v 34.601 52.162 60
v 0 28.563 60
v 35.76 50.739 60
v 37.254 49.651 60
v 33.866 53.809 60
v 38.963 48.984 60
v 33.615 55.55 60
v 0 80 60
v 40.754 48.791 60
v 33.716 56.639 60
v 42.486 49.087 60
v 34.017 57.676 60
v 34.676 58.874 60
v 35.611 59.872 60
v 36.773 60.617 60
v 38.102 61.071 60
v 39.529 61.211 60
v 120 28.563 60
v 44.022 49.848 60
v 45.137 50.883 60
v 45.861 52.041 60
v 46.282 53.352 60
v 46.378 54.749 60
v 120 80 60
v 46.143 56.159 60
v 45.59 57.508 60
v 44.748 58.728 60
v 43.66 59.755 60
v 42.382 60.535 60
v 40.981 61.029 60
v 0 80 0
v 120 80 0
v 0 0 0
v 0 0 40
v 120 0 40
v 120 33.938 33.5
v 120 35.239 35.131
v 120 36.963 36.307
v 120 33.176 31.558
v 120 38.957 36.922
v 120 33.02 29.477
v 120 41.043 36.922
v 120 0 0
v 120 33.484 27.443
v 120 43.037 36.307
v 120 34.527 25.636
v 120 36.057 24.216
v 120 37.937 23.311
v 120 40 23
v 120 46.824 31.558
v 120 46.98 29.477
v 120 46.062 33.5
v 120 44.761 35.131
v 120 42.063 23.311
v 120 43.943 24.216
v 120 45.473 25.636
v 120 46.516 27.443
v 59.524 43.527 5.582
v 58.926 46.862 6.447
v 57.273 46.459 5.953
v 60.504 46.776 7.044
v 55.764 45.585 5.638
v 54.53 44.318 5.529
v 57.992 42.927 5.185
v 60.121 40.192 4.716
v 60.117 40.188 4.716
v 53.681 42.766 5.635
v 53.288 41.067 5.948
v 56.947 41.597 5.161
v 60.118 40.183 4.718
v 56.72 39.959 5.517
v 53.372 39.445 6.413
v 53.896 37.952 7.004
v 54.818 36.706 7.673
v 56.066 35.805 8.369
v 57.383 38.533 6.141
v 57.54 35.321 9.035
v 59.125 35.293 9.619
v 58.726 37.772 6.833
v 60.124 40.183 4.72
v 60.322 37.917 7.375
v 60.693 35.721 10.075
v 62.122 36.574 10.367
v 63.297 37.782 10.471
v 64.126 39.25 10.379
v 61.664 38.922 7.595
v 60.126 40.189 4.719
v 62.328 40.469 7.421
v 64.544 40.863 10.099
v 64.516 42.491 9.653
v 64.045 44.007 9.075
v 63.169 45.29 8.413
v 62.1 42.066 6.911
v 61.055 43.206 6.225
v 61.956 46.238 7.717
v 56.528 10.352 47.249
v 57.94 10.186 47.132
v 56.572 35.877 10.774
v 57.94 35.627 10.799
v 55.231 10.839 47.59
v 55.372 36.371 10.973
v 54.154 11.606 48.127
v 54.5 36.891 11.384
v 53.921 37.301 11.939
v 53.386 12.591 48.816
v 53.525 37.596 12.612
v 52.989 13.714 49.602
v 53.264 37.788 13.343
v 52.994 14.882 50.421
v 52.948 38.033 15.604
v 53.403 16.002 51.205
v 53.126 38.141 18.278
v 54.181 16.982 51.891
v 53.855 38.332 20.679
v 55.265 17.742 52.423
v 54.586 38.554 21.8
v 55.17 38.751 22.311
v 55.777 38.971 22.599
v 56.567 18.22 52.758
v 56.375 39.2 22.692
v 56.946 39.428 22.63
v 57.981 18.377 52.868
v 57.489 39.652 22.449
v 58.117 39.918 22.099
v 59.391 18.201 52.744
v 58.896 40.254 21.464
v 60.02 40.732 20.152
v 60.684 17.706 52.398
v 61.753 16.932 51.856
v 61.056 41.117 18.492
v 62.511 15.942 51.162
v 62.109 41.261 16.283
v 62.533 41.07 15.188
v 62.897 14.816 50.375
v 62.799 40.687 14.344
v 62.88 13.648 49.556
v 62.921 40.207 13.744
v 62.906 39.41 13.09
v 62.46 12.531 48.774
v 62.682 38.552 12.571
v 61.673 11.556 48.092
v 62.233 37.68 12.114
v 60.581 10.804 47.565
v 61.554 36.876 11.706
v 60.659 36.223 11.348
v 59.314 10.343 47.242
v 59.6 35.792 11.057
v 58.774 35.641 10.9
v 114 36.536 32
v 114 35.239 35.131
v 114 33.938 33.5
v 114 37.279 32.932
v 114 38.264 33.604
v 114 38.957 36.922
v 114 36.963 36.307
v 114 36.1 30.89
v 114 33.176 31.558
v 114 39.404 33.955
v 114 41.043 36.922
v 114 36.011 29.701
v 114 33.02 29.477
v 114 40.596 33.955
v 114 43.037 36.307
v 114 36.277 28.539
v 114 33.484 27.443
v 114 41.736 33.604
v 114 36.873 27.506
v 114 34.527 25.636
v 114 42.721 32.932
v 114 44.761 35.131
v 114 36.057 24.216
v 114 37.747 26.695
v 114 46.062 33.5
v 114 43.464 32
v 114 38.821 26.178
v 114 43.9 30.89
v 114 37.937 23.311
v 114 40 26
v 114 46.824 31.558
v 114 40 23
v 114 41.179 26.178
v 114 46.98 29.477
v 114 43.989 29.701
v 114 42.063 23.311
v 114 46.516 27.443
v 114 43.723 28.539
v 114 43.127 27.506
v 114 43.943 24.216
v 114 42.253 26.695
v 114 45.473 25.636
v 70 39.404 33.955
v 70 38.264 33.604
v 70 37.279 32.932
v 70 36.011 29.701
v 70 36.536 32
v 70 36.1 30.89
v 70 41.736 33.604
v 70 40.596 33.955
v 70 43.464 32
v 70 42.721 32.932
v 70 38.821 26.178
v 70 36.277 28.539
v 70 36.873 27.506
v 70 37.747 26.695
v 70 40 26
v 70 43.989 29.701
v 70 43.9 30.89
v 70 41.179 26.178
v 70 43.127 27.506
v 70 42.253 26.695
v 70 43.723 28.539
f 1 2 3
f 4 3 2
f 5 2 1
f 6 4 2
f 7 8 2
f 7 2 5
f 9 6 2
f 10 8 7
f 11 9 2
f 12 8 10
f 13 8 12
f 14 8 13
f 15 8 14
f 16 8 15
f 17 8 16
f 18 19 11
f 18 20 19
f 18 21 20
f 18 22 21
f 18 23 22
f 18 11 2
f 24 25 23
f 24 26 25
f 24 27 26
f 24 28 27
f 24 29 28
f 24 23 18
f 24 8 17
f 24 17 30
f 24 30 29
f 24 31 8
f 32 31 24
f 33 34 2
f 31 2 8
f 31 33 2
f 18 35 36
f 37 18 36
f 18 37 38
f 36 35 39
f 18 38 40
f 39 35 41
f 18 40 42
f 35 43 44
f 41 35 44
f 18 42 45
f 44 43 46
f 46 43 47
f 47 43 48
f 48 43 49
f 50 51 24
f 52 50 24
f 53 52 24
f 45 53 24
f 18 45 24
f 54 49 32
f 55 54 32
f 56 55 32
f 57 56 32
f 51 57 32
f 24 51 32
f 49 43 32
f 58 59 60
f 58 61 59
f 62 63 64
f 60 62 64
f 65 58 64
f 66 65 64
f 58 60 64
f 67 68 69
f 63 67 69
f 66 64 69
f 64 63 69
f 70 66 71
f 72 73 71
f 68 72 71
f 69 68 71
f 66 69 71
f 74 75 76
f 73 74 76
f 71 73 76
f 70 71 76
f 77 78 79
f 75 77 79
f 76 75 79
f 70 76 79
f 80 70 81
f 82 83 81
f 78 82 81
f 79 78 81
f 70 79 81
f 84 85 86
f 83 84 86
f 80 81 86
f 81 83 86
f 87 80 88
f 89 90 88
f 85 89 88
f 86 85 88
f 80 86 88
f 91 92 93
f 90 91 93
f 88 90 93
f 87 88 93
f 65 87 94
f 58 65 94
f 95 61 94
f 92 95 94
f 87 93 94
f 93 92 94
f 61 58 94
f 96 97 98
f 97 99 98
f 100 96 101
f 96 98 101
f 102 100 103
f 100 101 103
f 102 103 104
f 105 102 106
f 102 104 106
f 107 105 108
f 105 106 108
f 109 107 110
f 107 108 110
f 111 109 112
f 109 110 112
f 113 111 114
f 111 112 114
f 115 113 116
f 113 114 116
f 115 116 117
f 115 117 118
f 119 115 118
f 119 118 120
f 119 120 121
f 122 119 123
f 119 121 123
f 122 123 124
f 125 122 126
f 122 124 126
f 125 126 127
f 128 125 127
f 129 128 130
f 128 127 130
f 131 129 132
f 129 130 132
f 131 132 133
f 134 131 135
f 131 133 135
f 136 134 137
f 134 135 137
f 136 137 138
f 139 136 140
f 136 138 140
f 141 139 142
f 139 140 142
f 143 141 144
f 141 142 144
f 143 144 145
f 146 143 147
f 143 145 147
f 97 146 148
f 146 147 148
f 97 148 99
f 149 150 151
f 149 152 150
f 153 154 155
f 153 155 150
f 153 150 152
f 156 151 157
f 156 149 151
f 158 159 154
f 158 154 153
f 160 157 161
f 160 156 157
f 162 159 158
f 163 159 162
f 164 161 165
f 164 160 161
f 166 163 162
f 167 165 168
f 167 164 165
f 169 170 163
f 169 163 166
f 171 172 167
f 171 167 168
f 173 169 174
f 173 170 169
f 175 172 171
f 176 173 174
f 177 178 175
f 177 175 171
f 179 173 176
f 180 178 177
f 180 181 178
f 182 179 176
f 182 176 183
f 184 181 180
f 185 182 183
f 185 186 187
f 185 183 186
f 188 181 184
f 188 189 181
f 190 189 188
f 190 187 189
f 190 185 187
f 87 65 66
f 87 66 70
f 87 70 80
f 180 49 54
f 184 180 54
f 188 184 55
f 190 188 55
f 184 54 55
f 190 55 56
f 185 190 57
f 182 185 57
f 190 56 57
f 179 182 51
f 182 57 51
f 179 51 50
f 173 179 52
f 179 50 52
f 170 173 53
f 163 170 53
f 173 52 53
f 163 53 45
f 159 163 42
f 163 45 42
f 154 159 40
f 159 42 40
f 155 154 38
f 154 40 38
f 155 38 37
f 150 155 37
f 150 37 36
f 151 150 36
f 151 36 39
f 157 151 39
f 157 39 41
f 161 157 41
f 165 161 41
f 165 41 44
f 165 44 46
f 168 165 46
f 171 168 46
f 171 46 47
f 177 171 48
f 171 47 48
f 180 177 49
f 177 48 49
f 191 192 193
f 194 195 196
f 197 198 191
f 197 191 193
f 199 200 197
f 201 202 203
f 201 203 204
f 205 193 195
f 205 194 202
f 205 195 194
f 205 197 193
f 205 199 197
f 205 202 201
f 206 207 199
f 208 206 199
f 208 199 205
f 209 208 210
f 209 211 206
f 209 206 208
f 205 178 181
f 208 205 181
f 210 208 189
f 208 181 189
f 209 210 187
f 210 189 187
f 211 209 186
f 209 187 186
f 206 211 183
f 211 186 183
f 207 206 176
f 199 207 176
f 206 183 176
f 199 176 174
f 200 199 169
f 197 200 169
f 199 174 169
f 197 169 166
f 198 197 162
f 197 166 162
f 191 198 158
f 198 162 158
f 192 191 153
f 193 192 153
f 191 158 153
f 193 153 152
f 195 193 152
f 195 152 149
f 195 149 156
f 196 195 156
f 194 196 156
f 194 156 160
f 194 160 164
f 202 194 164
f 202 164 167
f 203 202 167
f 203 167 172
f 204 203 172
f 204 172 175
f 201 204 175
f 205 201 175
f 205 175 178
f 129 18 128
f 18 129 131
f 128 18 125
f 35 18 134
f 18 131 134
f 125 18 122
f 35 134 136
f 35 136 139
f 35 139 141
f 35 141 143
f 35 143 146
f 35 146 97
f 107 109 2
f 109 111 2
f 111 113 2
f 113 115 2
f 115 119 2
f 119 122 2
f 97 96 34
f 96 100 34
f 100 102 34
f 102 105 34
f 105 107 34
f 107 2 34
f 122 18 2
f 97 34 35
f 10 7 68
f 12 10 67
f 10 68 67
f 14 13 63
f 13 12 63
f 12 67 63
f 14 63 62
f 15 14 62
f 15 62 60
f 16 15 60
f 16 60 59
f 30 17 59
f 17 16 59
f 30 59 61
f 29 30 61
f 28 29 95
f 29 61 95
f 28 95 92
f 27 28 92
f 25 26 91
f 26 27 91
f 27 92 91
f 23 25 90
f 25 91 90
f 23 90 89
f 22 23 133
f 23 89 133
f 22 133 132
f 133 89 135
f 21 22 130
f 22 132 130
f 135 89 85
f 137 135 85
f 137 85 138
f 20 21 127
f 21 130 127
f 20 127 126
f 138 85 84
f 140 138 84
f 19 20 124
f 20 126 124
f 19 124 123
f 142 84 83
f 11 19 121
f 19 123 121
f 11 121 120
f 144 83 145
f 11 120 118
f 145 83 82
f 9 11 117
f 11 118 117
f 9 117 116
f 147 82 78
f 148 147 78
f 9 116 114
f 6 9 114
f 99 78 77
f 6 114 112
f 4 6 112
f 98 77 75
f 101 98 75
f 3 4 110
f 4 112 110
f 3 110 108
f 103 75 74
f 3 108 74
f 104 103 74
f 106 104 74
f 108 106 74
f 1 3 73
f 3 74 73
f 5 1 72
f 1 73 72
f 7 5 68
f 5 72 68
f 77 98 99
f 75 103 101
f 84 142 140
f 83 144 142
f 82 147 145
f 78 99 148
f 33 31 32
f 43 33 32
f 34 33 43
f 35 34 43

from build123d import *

# Parameters (mm, degrees)
SKETCH_1_W          = 120
SKETCH_1_H          = 80
EXTRUDE_1_DEPTH     = 60
CUT_EXTRUDE_1_DEPTH = 157.204993518
SWEEP_2_PROFILE_R   = 6
CUT_EXTRUDE_2_DEPTH = 3.602159411
CUT_EXTRUDE_2_DRAFT = -59
SKETCH_5_R          = 7
CUT_EXTRUDE_3_DEPTH = 6
SKETCH_6_R          = 4
CUT_EXTRUDE_4_DEPTH = 50
SWEEP_4_PROFILE_R   = 5


with BuildPart() as part:
    # 草图1 → 凸台-拉伸1 (new body)
    with BuildSketch(Plane.XY):
        with Locations((60, 40)):
            Rectangle(SKETCH_1_W, SKETCH_1_H)
    extrude(amount=EXTRUDE_1_DEPTH)

    # 草图2 → 切除-拉伸1 (cut, through all)
    with BuildSketch(Plane(origin=(0, 0, 0), x_dir=(0, 0, -1), z_dir=(1, 0, 0))):
        Polygon((-40, 0), (-60, 0), (-60, 28.56287), align=None)
    extrude(amount=CUT_EXTRUDE_1_DEPTH, mode=Mode.SUBTRACT)

    # 切除-扫描2: sweep along a curve in space
    with BuildLine() as sweep_2_path:
        Line((36.683319, 57.441689, 69.112507), (58.926443, 41.066649, 8.000026))
    # 切除-扫描2 profile (on start of the path) → 切除-扫描2 (sweep, cut)
    with BuildSketch(Plane(origin=(36.683319, 57.441689, 69.112507), x_dir=(-0.9396926209151826, 0, -0.34202014297049077), z_dir=(0.3316681247446686, -0.24416888605300846, -0.9112506845605045))):
        Circle(SWEEP_2_PROFILE_R)
    sweep(path=sweep_2_path.line, mode=Mode.SUBTRACT)


with BuildPart() as cut_extrude_2_tool:
    # 草图4 → 切除-拉伸2 (with draft: the straight prism first)
    with BuildSketch(Plane(origin=(0.738557167, -0.543714235, -2.029169141), x_dir=(0.9433961283725703, 0.08584202767282707, 0.3203668073578514), z_dir=(-0.3316681247446686, 0.2441688860530088, 0.9112506845605044))):
        with BuildLine():
            ThreePointArc((61.679165391, 31.596777759), (67.679165393, 37.596777757), (61.679165395, 43.596777759))
            ThreePointArc((61.679165395, 43.596777759), (55.679165393, 37.596777761), (61.679165391, 31.596777759))
        make_face()
    extrude(amount=-CUT_EXTRUDE_2_DEPTH)
    # 切除-拉伸2: the draft: its side faces are tilted about the plane it starts from
    cut_extrude_2_sides = [cut_extrude_2_tool.faces().sort_by_distance(p)[0] for p in [
        (59.523803726, 34.831326418, 7.911705161),
    ]]
    draft(cut_extrude_2_sides, Plane(origin=(0.738557167, -0.543714235, -2.029169141), x_dir=(0.9433961283725703, 0.08584202767282707, 0.3203668073578514), z_dir=(-0.3316681247446686, 0.2441688860530088, 0.9112506845605044)), CUT_EXTRUDE_2_DRAFT)


with BuildPart() as part_1:
    add(part.part)

    # 切除-拉伸2: cut by cut_extrude_2_tool
    add(cut_extrude_2_tool.part, mode=Mode.SUBTRACT)

    # 草图5 → 切除-拉伸3 (cut)
    with BuildSketch(Plane(origin=(120, 0, 0), x_dir=(0, 0, -1), z_dir=(1, 0, 0))):
        with Locations((-30, 40)):
            Circle(SKETCH_5_R)
    extrude(amount=-CUT_EXTRUDE_3_DEPTH, mode=Mode.SUBTRACT)

    # 草图6 → 切除-拉伸4 (cut)
    with BuildSketch(Plane(origin=(120, 0, 0), x_dir=(0, 0, -1), z_dir=(1, 0, 0))):
        with Locations((-30, 40)):
            Circle(SKETCH_6_R)
    extrude(amount=-CUT_EXTRUDE_4_DEPTH, mode=Mode.SUBTRACT)

    # 切除-扫描4: sweep along a curve in space
    with BuildLine() as sweep_4_path:
        Line((57.9403, 8.545716, 58.19152), (57.9403, 41.792672, 10.709946))
    # 切除-扫描4 profile (on start of the path) → 切除-扫描4 (sweep, cut)
    with BuildSketch(Plane(origin=(57.9403, 8.545716, 58.19152), x_dir=(0, -0.8191520446202117, -0.573576435878015), z_dir=(0, 0.573576435878015, -0.8191520446202117))):
        Circle(SWEEP_4_PROFILE_R)
    sweep(path=sweep_4_path.line, mode=Mode.SUBTRACT)


solid = part_1.part
